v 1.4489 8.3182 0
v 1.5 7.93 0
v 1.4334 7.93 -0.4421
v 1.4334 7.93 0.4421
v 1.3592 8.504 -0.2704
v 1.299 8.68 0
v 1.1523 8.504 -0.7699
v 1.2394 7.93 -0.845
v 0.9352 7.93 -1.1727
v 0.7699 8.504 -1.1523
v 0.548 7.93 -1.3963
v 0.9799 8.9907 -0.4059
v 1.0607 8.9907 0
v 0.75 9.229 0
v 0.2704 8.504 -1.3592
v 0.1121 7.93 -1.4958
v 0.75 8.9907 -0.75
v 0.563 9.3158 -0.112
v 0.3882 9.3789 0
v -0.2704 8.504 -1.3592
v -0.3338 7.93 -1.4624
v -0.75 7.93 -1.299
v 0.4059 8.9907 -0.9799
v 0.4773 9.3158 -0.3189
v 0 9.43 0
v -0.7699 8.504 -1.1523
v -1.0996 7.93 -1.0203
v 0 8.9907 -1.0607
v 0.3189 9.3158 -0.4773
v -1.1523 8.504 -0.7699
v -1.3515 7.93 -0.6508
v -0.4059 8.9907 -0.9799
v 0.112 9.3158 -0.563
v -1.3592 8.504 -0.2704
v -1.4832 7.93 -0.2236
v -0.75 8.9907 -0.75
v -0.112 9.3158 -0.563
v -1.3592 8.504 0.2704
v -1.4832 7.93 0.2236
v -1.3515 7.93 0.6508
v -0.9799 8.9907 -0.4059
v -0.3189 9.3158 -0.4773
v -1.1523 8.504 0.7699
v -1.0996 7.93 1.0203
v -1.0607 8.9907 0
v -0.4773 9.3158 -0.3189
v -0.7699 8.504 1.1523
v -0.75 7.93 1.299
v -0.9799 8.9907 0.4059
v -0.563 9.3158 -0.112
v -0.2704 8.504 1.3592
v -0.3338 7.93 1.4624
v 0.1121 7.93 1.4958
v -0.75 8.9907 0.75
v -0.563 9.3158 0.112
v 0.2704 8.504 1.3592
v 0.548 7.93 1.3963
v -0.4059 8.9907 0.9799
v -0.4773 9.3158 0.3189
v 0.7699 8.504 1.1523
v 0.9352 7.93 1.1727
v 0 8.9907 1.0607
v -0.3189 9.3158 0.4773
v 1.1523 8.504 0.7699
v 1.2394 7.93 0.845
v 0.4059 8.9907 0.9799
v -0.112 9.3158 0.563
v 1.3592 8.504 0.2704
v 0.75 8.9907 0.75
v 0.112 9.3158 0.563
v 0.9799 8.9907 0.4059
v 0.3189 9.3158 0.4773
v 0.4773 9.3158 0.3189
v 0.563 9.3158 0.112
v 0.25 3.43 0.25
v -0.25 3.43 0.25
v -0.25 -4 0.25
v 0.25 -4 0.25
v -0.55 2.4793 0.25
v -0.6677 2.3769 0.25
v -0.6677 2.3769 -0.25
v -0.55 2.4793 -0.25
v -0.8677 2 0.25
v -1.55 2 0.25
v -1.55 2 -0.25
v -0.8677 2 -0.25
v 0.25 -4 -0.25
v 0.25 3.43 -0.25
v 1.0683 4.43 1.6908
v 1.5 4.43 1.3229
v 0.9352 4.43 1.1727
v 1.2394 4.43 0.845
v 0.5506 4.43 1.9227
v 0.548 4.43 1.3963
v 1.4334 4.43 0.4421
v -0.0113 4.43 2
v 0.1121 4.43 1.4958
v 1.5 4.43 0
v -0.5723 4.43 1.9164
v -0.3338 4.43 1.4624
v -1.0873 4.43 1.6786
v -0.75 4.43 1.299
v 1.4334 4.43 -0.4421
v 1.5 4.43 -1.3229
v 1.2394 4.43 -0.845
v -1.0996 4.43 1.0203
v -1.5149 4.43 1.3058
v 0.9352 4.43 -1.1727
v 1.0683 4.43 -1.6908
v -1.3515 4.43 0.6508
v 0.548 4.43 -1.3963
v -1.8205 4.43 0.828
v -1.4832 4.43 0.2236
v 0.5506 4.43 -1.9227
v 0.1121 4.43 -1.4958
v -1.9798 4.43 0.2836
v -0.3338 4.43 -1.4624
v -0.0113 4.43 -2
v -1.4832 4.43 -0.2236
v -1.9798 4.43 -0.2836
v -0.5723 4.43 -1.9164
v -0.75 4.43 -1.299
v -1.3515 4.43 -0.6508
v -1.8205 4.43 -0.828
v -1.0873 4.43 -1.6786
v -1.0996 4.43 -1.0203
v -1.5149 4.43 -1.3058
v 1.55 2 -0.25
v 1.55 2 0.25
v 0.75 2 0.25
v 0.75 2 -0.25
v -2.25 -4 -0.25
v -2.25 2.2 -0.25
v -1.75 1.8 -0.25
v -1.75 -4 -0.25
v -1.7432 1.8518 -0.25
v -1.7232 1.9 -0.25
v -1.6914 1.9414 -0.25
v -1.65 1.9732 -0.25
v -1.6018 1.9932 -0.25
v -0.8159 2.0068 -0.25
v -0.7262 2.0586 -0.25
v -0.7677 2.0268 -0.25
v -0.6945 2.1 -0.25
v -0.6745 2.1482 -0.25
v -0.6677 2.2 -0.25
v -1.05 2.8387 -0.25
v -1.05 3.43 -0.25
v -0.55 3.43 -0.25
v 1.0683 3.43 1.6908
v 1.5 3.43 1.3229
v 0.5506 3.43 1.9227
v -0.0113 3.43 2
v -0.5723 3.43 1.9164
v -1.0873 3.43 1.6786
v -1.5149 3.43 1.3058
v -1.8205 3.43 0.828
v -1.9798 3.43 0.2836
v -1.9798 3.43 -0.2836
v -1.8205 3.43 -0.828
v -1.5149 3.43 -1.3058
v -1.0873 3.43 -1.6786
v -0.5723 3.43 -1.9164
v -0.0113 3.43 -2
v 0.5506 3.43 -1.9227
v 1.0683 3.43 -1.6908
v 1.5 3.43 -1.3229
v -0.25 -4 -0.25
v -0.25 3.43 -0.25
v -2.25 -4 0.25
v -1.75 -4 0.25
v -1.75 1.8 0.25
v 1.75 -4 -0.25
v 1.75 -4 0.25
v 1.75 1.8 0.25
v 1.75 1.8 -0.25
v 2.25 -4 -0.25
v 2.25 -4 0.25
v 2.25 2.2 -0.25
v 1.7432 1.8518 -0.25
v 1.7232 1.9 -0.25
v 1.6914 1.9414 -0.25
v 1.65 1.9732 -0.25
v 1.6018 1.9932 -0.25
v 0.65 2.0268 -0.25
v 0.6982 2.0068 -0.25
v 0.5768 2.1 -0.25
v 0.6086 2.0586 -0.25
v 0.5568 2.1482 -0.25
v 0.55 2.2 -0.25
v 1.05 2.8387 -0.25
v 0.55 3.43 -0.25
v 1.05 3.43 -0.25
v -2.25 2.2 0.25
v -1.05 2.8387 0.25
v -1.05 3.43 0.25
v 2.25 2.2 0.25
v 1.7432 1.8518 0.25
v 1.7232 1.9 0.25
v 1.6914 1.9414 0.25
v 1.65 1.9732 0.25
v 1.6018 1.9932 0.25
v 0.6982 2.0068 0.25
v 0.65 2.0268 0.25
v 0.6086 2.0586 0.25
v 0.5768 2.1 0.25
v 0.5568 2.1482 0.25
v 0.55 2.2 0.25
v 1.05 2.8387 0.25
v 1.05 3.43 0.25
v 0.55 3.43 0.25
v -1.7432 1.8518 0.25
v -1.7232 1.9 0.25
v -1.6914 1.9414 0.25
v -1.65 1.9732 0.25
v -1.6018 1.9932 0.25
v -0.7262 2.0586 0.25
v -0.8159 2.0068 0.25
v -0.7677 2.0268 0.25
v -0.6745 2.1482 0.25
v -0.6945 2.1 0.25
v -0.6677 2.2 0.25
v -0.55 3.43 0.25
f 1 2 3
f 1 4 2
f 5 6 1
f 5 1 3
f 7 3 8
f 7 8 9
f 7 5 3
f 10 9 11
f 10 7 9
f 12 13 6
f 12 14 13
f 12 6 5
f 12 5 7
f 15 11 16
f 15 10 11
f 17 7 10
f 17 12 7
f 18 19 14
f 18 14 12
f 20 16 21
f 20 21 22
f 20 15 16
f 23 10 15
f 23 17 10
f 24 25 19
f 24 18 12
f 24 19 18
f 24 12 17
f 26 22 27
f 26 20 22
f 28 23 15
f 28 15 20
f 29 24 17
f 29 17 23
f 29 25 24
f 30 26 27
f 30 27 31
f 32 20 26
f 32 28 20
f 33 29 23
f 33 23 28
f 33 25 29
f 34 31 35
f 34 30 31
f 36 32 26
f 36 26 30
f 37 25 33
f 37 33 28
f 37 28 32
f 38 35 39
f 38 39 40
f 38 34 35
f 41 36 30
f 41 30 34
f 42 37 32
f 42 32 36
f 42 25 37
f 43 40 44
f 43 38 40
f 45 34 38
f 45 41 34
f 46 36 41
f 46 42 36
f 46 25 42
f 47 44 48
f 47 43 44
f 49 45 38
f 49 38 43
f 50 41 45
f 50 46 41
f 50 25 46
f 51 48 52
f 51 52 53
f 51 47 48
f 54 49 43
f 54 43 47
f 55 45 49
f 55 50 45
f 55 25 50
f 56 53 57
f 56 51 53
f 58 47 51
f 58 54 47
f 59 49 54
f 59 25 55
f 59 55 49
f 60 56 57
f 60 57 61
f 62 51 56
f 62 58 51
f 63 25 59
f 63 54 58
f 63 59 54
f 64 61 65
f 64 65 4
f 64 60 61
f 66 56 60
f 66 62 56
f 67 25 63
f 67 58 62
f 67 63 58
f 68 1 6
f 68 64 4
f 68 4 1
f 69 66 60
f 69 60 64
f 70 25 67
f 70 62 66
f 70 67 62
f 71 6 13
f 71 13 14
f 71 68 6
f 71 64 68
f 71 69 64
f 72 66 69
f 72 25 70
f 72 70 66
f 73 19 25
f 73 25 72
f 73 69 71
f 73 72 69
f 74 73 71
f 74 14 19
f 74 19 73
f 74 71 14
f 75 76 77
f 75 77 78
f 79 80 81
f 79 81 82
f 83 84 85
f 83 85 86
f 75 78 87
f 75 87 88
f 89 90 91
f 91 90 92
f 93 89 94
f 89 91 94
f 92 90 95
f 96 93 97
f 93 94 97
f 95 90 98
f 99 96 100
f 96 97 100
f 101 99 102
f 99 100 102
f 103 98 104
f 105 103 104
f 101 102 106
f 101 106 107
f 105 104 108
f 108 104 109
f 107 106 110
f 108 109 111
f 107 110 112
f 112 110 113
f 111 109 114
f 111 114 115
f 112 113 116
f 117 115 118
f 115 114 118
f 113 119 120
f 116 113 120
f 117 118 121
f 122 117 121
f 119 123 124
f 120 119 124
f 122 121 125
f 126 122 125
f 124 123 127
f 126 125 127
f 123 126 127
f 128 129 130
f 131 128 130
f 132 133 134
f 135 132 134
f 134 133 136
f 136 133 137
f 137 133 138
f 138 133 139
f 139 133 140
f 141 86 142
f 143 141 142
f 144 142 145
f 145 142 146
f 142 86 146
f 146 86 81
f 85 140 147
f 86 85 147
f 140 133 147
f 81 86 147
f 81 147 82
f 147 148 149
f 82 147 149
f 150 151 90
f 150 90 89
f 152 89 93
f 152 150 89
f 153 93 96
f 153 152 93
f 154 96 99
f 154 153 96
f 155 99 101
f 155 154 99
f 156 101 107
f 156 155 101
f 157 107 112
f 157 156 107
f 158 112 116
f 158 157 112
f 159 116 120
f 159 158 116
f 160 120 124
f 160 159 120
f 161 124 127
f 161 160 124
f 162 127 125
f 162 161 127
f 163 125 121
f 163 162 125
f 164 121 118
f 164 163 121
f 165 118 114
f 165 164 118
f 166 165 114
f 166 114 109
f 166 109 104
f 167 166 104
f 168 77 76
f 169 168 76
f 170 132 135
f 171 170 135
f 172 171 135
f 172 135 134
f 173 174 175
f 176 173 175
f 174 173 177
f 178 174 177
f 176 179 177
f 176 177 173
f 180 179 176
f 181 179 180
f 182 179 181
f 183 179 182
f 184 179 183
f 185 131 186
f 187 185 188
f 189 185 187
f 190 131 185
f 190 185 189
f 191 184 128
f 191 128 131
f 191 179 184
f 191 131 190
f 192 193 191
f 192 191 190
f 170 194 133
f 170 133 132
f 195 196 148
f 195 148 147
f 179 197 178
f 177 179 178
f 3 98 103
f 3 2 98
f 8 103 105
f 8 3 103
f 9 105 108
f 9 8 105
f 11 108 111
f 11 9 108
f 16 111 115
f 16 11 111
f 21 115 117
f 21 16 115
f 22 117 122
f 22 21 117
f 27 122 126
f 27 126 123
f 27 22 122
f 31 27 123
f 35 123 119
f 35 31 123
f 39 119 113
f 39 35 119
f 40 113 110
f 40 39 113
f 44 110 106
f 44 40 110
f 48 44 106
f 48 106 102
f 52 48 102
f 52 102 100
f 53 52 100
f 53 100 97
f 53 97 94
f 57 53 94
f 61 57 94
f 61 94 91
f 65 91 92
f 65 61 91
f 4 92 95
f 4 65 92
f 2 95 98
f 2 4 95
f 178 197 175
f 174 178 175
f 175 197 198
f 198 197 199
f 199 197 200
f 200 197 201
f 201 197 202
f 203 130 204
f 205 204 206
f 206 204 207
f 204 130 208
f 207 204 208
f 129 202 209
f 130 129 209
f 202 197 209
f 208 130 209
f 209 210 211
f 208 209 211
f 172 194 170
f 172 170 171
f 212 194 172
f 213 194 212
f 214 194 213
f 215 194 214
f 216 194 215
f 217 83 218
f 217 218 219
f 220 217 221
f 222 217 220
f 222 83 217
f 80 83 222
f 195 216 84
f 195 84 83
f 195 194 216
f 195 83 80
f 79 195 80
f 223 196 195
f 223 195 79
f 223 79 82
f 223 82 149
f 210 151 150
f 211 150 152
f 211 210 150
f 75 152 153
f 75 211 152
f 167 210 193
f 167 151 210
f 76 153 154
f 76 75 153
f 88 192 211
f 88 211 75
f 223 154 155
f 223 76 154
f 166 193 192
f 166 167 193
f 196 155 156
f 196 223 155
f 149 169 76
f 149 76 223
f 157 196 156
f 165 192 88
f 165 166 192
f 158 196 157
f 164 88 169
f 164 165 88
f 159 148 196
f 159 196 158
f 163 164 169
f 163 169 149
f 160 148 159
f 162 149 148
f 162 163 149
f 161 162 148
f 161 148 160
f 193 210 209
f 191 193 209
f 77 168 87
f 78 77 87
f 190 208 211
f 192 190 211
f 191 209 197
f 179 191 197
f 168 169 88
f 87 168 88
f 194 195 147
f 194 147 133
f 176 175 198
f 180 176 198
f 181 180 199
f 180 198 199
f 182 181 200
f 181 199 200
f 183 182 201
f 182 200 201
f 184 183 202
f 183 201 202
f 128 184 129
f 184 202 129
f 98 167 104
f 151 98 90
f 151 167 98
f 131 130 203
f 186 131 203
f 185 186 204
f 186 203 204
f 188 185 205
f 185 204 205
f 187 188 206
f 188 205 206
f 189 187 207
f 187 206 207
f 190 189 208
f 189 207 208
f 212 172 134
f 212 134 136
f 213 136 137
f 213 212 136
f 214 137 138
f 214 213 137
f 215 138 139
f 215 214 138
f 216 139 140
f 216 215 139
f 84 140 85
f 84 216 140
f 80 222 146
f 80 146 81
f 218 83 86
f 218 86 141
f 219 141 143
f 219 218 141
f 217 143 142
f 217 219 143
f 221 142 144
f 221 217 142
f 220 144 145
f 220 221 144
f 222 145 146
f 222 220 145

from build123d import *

# Parameters (mm, degrees)
ESBO_O1_W                       = 0.5
ESBO_O1_H                       = 0.5
RESSALTO_EXTRUS_O1_DEPTH        = 1
RESSALTO_EXTRUS_O1_DEPTH_BACK   = 4
RESSALTO_EXTRUS_O1_2_DEPTH      = 1
RESSALTO_EXTRUS_O1_2_DEPTH_BACK = 4
RESSALTO_EXTRUS_O1_3_DEPTH      = 1
RESSALTO_EXTRUS_O1_3_DEPTH_BACK = 4
ESBO_O2_W                       = 0.5
ESBO_O2_H                       = 2.43
RESSALTO_EXTRUS_O2_DEPTH        = 0.5
RESSALTO_EXTRUS_O3_DEPTH        = 1


with BuildPart() as part:
    # Esboço1 → Ressalto-extrusão1 (new body, two sides)
    with BuildSketch(Plane(origin=(0, 0, 0), x_dir=(1, 0, 0), z_dir=(0, 1, 0))) as ressalto_extrus_o1_sk:
        Rectangle(ESBO_O1_W, ESBO_O1_H)
    extrude(amount=RESSALTO_EXTRUS_O1_DEPTH)
    extrude(ressalto_extrus_o1_sk.sketch, amount=-RESSALTO_EXTRUS_O1_DEPTH_BACK)



with BuildPart() as body_2:
    # Esboço1 → Ressalto-extrus_o1 2 (new body, two sides)
    with BuildSketch(Plane(origin=(0, 0, 0), x_dir=(1, 0, 0), z_dir=(0, 1, 0))) as ressalto_extrus_o1_2_sk:
        with Locations((2, 0)):
            Rectangle(ESBO_O1_W, ESBO_O1_H)
    extrude(amount=RESSALTO_EXTRUS_O1_2_DEPTH)
    extrude(ressalto_extrus_o1_2_sk.sketch, amount=-RESSALTO_EXTRUS_O1_2_DEPTH_BACK)


with BuildPart() as body_3:
    # Esboço1 → Ressalto-extrus_o1 3 (new body, two sides)
    with BuildSketch(Plane(origin=(0, 0, 0), x_dir=(1, 0, 0), z_dir=(0, 1, 0))) as ressalto_extrus_o1_3_sk:
        with Locations((-2, 0)):
            Rectangle(ESBO_O1_W, ESBO_O1_H)
    extrude(amount=RESSALTO_EXTRUS_O1_3_DEPTH)
    extrude(ressalto_extrus_o1_3_sk.sketch, amount=-RESSALTO_EXTRUS_O1_3_DEPTH_BACK)


with BuildPart() as part_1:
    add(part.part)

    add(body_2.part)  # Ressalto-extrusão2 merges body 2

    add(body_3.part)  # Ressalto-extrusão2 merges body 3
    # Esboço2 → Ressalto-extrusão2 (add)
    with BuildSketch(Plane.XY.offset(0.25)):
        with BuildLine():
            Line((-2.25, 2.2), (-2.25, 1))
            Line((-2.25, 1), (-1.75, 1))
            Line((-1.75, 1), (-1.75, 1.8))
            ThreePointArc((-1.75, 1.8), (-1.691421356, 1.941421356), (-1.55, 2))
            Line((-1.55, 2), (-0.867667764, 2))
            ThreePointArc((-0.867667764, 2), (-0.726246408, 2.058578644), (-0.667667764, 2.2))
            Line((-0.667667764, 2.2), (-0.667667764, 2.376879859))
            Line((-0.667667764, 2.376879859), (-0.55, 2.479277604))
            Line((-0.55, 2.479277604), (-0.55, 3.43))
            Line((-0.55, 3.43), (-1.05, 3.43))
            Line((-1.05, 3.43), (-1.05, 2.83866396))
            Line((-1.05, 2.83866396), (-2.25, 2.2))
        make_face()
        with Locations((0, 2.215)):
            Rectangle(ESBO_O2_W, ESBO_O2_H)
        with BuildLine():
            Line((1.75, 1), (1.75, 1.8))
            ThreePointArc((1.75, 1.8), (1.691421356, 1.941421356), (1.55, 2))
            Line((1.55, 2), (0.75, 2))
            ThreePointArc((0.75, 2), (0.608578644, 2.058578644), (0.55, 2.2))
            Line((0.55, 2.2), (0.55, 3.43))
            Line((0.55, 3.43), (1.05, 3.43))
            Line((1.05, 3.43), (1.05, 2.83866396))
            Line((1.05, 2.83866396), (2.25, 2.2))
            Line((2.25, 2.2), (2.25, 1))
            Line((2.25, 1), (1.75, 1))
        make_face()
    extrude(amount=-RESSALTO_EXTRUS_O2_DEPTH)

    # Esboço3 → Ressalto-extrusão3 (add)
    with BuildSketch(Plane(origin=(0, 3.43, 0), x_dir=(1, 0, 0), z_dir=(0, 1, 0))):
        with BuildLine():
            Line((1.5, 1.322875656), (1.5, -1.322875656))
            ThreePointArc((1.5, -1.322875656), (-2, 0), (1.5, 1.322875656))
        make_face()
    extrude(amount=RESSALTO_EXTRUS_O3_DEPTH)

    # Esboço4 → Revolução1 (revolve)
    with BuildSketch(Plane.XY):
        with BuildLine():
            Line((0, 4.43), (1.5, 4.43))
            Line((1.5, 4.43), (1.5, 7.93))
            ThreePointArc((1.5, 7.93), (1.060660172, 8.990660172), (0, 9.43))
            Line((0, 9.43), (0, 4.43))
        make_face()
    revolve(axis=Axis((0, 4.43, 0), (0, 1, 0)))


solid = part_1.part
